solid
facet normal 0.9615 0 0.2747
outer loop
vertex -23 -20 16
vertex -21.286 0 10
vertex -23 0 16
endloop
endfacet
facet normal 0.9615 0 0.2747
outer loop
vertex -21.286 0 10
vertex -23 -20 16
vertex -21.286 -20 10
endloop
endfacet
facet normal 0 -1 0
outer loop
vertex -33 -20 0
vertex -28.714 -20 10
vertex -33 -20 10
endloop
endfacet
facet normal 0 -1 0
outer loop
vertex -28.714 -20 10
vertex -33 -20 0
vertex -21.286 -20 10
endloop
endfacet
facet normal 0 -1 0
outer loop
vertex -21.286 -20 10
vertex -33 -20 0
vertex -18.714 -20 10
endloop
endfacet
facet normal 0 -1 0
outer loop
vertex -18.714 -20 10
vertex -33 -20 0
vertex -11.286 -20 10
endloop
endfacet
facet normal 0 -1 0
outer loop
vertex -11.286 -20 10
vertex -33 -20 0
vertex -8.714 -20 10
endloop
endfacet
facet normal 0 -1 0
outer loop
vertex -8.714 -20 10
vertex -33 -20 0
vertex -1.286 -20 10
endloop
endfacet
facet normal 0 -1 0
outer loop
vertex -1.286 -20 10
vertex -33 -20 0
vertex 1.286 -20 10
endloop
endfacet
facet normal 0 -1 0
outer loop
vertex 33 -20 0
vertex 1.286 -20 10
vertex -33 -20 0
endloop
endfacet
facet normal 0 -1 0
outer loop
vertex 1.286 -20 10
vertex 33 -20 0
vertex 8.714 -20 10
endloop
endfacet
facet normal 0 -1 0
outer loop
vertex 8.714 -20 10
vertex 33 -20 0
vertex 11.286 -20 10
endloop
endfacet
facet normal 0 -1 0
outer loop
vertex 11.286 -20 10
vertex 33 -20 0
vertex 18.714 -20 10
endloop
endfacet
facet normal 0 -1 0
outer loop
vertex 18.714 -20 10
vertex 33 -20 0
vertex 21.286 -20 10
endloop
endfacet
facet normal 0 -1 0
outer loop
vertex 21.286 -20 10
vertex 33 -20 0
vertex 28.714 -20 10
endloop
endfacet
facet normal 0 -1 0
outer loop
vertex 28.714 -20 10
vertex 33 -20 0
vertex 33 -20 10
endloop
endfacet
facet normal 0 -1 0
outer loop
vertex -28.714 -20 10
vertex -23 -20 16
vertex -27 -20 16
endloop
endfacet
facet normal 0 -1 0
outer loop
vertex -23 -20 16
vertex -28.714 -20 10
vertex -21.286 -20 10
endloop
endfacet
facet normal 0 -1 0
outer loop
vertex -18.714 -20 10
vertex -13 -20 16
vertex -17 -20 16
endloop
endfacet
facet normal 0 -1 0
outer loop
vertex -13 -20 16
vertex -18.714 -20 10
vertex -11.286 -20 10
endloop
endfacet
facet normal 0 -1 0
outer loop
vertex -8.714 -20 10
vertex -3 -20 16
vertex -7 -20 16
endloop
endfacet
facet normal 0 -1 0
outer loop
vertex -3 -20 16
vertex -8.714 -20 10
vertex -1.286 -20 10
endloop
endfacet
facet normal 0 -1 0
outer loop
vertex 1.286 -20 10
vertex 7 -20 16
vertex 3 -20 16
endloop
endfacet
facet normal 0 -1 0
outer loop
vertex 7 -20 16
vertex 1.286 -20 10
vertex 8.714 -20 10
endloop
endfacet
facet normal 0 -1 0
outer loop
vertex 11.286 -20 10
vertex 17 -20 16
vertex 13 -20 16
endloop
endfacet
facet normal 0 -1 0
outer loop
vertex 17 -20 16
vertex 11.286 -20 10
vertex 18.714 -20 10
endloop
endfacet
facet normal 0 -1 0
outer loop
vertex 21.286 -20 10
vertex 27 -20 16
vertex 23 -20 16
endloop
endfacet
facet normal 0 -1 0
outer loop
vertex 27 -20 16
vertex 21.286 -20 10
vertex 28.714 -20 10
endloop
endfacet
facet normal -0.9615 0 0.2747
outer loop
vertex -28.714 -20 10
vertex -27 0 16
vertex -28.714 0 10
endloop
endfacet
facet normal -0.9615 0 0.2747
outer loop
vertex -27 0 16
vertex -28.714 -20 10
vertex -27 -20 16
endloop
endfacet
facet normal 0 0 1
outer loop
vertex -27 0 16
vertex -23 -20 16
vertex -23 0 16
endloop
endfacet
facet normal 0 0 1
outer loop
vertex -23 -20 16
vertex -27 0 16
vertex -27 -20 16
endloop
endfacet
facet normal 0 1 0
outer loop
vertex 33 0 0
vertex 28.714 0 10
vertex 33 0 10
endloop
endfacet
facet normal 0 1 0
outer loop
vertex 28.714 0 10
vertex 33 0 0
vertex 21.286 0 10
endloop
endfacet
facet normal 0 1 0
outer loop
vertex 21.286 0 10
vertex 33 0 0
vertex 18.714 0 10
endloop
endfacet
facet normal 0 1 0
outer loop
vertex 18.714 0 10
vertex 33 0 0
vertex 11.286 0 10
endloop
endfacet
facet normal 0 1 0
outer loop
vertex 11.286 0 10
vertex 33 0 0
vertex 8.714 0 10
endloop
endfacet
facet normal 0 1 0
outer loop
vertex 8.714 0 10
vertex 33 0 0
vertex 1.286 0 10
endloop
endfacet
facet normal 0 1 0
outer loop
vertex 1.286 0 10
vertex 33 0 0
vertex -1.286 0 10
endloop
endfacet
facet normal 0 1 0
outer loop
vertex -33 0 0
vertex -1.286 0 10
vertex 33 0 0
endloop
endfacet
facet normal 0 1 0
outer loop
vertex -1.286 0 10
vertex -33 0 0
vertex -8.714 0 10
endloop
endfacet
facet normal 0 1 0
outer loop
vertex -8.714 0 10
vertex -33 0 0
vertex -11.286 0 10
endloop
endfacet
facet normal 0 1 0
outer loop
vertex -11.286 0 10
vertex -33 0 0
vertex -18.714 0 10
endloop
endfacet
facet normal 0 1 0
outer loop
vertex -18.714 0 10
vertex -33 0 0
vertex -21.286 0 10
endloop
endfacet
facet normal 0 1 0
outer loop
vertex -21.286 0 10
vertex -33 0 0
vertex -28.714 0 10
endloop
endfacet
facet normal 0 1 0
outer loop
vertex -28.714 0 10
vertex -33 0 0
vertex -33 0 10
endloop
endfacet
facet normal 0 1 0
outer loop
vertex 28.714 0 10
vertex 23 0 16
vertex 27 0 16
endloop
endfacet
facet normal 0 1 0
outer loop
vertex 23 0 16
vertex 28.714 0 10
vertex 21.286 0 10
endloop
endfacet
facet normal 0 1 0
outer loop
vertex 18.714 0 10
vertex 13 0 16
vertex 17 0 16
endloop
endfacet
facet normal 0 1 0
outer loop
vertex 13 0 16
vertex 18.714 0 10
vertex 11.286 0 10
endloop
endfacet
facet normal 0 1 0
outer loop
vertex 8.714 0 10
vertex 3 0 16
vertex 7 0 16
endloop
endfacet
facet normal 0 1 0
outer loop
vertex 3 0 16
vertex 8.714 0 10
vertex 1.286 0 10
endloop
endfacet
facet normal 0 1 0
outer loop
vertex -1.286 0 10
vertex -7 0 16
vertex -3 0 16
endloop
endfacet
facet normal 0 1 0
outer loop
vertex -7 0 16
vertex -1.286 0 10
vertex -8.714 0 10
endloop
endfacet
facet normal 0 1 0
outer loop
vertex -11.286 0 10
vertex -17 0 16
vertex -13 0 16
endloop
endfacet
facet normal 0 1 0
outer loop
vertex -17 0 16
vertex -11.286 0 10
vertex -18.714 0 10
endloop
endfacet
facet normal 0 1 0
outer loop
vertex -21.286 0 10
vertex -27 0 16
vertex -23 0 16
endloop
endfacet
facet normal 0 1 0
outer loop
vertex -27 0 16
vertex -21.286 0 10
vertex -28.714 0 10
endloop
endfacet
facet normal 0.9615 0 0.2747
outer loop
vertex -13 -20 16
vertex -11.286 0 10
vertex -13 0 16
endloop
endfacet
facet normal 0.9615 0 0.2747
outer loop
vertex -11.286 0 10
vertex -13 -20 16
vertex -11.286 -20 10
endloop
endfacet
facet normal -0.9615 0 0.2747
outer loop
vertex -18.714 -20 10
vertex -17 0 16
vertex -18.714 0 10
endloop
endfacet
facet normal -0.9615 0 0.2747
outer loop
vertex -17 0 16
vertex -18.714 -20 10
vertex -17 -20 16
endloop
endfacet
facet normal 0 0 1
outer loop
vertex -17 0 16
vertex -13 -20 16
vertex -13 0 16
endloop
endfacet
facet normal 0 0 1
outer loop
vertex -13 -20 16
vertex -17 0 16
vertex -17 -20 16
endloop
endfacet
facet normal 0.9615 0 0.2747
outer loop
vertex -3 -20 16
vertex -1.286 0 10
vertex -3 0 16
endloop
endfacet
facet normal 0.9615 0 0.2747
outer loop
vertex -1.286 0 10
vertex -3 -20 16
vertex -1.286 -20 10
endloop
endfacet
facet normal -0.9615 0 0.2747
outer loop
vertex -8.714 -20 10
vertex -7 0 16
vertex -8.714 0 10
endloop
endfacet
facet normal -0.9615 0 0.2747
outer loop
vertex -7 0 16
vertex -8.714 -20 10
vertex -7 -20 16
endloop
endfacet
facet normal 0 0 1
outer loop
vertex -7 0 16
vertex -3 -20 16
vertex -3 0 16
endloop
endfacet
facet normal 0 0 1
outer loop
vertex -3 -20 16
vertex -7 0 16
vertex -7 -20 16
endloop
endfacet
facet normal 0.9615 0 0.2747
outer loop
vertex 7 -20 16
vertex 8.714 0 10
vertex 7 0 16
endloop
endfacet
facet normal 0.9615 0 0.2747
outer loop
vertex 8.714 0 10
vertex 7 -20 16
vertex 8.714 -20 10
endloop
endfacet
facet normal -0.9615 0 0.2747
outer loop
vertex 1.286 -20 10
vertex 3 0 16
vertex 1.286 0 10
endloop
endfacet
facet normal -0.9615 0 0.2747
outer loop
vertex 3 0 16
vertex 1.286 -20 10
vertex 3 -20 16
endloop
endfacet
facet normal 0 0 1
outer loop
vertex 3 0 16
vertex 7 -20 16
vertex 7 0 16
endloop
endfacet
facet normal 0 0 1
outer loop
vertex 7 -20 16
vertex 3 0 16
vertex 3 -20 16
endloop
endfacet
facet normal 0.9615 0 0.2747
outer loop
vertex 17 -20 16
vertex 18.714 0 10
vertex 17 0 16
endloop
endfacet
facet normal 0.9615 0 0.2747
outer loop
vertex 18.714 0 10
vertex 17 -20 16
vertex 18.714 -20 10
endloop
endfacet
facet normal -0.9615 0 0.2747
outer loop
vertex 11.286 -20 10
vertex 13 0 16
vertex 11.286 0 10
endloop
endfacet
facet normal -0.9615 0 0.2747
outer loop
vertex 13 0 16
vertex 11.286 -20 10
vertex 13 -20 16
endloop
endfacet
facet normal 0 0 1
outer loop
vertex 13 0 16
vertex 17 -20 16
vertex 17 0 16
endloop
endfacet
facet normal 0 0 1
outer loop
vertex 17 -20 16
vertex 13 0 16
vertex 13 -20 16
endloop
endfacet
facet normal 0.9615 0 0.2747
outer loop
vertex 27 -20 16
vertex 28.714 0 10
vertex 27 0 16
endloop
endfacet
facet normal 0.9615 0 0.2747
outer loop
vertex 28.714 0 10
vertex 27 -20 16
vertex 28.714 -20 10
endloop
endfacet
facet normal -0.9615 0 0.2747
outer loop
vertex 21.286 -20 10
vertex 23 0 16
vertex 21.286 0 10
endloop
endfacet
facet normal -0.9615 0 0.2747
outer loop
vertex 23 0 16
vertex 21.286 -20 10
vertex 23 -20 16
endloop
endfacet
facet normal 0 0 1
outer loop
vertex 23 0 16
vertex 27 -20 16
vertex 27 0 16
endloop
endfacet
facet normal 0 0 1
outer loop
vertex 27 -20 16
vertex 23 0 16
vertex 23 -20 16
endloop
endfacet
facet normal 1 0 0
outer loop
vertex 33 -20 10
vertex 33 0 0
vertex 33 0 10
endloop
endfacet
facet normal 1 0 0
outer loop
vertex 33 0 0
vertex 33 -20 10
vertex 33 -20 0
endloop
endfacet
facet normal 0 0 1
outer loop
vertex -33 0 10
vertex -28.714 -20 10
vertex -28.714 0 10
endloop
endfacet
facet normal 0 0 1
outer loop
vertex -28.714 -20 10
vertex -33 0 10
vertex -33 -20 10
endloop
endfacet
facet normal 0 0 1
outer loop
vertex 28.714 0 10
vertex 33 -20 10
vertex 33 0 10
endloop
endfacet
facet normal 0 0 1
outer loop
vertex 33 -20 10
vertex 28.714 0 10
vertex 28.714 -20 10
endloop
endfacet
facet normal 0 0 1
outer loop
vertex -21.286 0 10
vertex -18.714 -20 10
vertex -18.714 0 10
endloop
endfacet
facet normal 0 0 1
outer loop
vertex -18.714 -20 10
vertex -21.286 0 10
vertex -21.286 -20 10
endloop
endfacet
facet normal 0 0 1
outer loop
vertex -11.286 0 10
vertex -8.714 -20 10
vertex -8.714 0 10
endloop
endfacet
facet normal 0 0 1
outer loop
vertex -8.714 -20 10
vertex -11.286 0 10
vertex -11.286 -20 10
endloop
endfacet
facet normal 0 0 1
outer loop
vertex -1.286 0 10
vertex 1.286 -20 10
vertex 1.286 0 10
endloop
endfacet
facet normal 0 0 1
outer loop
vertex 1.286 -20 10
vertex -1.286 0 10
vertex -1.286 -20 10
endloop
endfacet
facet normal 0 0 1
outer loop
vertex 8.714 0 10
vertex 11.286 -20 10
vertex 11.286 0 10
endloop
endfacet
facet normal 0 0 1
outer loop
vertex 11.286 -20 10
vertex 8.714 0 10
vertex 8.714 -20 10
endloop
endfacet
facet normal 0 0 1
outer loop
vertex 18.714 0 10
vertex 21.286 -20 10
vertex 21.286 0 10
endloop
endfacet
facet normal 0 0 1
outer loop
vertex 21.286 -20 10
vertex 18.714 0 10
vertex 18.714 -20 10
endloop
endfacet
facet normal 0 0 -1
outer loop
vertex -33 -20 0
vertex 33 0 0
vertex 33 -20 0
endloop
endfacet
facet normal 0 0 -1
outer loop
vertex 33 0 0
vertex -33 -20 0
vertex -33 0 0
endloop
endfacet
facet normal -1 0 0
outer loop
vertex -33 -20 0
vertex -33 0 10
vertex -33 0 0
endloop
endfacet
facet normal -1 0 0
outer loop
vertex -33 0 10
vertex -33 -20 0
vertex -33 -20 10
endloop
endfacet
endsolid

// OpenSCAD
$fn = 32;

// ----------------------------------------------------------------------
// Toothed rack, 6 teeth
// 10 mm pitch, 6 mm teeth
// ----------------------------------------------------------------------

// --- parameters (mm) ---
bar_w = 20;   // bar width (Y)
bar_h = 10;   // bar height (Z)
teeth = 6;    // number of teeth
pitch = 10;   // tooth pitch
tooth_h = 6;  // tooth height above the bar
root_w = 8;   // tooth width at the root
crest_w = 4;  // tooth width at the crest

// --- derived feature positions (mm) ---
span = (teeth - 1) * pitch;  // = 50   distance between the outer teeth
bar_l = span + root_w + 8;   // = 66   bar length: teeth plus 4 mm at each end
tooth_x = -span / 2;         // = -25   X of the first tooth
height = bar_h + tooth_h;    // = 16   overall height
feature_centers = [
  [tooth_x + 0 * pitch, -bar_w / 2],
  [tooth_x + 1 * pitch, -bar_w / 2],
  [tooth_x + 2 * pitch, -bar_w / 2],
  [tooth_x + 3 * pitch, -bar_w / 2],
  [tooth_x + 4 * pitch, -bar_w / 2],
  [tooth_x + 5 * pitch, -bar_w / 2]
];   // tooth centre line, drives the tooth loop

// bar with a rack of teeth, one extruded trapezoium per centre
module rack_tooth() {
  linear_extrude(height = bar_w)
    polygon(points = [
      [0, 0],
      [root_w, 0],
      [root_w / 2 + crest_w / 2, tooth_h + 1],
      [root_w / 2 - crest_w / 2, tooth_h + 1]
    ]);
}

union() {
  translate([-bar_l / 2, -bar_w, 0]) cube([bar_l, bar_w, bar_h]);
  for (centre = feature_centers)
    translate([centre[0] - root_w / 2, 0, bar_h - 1]) rotate([90, 0, 0]) rack_tooth();
}
